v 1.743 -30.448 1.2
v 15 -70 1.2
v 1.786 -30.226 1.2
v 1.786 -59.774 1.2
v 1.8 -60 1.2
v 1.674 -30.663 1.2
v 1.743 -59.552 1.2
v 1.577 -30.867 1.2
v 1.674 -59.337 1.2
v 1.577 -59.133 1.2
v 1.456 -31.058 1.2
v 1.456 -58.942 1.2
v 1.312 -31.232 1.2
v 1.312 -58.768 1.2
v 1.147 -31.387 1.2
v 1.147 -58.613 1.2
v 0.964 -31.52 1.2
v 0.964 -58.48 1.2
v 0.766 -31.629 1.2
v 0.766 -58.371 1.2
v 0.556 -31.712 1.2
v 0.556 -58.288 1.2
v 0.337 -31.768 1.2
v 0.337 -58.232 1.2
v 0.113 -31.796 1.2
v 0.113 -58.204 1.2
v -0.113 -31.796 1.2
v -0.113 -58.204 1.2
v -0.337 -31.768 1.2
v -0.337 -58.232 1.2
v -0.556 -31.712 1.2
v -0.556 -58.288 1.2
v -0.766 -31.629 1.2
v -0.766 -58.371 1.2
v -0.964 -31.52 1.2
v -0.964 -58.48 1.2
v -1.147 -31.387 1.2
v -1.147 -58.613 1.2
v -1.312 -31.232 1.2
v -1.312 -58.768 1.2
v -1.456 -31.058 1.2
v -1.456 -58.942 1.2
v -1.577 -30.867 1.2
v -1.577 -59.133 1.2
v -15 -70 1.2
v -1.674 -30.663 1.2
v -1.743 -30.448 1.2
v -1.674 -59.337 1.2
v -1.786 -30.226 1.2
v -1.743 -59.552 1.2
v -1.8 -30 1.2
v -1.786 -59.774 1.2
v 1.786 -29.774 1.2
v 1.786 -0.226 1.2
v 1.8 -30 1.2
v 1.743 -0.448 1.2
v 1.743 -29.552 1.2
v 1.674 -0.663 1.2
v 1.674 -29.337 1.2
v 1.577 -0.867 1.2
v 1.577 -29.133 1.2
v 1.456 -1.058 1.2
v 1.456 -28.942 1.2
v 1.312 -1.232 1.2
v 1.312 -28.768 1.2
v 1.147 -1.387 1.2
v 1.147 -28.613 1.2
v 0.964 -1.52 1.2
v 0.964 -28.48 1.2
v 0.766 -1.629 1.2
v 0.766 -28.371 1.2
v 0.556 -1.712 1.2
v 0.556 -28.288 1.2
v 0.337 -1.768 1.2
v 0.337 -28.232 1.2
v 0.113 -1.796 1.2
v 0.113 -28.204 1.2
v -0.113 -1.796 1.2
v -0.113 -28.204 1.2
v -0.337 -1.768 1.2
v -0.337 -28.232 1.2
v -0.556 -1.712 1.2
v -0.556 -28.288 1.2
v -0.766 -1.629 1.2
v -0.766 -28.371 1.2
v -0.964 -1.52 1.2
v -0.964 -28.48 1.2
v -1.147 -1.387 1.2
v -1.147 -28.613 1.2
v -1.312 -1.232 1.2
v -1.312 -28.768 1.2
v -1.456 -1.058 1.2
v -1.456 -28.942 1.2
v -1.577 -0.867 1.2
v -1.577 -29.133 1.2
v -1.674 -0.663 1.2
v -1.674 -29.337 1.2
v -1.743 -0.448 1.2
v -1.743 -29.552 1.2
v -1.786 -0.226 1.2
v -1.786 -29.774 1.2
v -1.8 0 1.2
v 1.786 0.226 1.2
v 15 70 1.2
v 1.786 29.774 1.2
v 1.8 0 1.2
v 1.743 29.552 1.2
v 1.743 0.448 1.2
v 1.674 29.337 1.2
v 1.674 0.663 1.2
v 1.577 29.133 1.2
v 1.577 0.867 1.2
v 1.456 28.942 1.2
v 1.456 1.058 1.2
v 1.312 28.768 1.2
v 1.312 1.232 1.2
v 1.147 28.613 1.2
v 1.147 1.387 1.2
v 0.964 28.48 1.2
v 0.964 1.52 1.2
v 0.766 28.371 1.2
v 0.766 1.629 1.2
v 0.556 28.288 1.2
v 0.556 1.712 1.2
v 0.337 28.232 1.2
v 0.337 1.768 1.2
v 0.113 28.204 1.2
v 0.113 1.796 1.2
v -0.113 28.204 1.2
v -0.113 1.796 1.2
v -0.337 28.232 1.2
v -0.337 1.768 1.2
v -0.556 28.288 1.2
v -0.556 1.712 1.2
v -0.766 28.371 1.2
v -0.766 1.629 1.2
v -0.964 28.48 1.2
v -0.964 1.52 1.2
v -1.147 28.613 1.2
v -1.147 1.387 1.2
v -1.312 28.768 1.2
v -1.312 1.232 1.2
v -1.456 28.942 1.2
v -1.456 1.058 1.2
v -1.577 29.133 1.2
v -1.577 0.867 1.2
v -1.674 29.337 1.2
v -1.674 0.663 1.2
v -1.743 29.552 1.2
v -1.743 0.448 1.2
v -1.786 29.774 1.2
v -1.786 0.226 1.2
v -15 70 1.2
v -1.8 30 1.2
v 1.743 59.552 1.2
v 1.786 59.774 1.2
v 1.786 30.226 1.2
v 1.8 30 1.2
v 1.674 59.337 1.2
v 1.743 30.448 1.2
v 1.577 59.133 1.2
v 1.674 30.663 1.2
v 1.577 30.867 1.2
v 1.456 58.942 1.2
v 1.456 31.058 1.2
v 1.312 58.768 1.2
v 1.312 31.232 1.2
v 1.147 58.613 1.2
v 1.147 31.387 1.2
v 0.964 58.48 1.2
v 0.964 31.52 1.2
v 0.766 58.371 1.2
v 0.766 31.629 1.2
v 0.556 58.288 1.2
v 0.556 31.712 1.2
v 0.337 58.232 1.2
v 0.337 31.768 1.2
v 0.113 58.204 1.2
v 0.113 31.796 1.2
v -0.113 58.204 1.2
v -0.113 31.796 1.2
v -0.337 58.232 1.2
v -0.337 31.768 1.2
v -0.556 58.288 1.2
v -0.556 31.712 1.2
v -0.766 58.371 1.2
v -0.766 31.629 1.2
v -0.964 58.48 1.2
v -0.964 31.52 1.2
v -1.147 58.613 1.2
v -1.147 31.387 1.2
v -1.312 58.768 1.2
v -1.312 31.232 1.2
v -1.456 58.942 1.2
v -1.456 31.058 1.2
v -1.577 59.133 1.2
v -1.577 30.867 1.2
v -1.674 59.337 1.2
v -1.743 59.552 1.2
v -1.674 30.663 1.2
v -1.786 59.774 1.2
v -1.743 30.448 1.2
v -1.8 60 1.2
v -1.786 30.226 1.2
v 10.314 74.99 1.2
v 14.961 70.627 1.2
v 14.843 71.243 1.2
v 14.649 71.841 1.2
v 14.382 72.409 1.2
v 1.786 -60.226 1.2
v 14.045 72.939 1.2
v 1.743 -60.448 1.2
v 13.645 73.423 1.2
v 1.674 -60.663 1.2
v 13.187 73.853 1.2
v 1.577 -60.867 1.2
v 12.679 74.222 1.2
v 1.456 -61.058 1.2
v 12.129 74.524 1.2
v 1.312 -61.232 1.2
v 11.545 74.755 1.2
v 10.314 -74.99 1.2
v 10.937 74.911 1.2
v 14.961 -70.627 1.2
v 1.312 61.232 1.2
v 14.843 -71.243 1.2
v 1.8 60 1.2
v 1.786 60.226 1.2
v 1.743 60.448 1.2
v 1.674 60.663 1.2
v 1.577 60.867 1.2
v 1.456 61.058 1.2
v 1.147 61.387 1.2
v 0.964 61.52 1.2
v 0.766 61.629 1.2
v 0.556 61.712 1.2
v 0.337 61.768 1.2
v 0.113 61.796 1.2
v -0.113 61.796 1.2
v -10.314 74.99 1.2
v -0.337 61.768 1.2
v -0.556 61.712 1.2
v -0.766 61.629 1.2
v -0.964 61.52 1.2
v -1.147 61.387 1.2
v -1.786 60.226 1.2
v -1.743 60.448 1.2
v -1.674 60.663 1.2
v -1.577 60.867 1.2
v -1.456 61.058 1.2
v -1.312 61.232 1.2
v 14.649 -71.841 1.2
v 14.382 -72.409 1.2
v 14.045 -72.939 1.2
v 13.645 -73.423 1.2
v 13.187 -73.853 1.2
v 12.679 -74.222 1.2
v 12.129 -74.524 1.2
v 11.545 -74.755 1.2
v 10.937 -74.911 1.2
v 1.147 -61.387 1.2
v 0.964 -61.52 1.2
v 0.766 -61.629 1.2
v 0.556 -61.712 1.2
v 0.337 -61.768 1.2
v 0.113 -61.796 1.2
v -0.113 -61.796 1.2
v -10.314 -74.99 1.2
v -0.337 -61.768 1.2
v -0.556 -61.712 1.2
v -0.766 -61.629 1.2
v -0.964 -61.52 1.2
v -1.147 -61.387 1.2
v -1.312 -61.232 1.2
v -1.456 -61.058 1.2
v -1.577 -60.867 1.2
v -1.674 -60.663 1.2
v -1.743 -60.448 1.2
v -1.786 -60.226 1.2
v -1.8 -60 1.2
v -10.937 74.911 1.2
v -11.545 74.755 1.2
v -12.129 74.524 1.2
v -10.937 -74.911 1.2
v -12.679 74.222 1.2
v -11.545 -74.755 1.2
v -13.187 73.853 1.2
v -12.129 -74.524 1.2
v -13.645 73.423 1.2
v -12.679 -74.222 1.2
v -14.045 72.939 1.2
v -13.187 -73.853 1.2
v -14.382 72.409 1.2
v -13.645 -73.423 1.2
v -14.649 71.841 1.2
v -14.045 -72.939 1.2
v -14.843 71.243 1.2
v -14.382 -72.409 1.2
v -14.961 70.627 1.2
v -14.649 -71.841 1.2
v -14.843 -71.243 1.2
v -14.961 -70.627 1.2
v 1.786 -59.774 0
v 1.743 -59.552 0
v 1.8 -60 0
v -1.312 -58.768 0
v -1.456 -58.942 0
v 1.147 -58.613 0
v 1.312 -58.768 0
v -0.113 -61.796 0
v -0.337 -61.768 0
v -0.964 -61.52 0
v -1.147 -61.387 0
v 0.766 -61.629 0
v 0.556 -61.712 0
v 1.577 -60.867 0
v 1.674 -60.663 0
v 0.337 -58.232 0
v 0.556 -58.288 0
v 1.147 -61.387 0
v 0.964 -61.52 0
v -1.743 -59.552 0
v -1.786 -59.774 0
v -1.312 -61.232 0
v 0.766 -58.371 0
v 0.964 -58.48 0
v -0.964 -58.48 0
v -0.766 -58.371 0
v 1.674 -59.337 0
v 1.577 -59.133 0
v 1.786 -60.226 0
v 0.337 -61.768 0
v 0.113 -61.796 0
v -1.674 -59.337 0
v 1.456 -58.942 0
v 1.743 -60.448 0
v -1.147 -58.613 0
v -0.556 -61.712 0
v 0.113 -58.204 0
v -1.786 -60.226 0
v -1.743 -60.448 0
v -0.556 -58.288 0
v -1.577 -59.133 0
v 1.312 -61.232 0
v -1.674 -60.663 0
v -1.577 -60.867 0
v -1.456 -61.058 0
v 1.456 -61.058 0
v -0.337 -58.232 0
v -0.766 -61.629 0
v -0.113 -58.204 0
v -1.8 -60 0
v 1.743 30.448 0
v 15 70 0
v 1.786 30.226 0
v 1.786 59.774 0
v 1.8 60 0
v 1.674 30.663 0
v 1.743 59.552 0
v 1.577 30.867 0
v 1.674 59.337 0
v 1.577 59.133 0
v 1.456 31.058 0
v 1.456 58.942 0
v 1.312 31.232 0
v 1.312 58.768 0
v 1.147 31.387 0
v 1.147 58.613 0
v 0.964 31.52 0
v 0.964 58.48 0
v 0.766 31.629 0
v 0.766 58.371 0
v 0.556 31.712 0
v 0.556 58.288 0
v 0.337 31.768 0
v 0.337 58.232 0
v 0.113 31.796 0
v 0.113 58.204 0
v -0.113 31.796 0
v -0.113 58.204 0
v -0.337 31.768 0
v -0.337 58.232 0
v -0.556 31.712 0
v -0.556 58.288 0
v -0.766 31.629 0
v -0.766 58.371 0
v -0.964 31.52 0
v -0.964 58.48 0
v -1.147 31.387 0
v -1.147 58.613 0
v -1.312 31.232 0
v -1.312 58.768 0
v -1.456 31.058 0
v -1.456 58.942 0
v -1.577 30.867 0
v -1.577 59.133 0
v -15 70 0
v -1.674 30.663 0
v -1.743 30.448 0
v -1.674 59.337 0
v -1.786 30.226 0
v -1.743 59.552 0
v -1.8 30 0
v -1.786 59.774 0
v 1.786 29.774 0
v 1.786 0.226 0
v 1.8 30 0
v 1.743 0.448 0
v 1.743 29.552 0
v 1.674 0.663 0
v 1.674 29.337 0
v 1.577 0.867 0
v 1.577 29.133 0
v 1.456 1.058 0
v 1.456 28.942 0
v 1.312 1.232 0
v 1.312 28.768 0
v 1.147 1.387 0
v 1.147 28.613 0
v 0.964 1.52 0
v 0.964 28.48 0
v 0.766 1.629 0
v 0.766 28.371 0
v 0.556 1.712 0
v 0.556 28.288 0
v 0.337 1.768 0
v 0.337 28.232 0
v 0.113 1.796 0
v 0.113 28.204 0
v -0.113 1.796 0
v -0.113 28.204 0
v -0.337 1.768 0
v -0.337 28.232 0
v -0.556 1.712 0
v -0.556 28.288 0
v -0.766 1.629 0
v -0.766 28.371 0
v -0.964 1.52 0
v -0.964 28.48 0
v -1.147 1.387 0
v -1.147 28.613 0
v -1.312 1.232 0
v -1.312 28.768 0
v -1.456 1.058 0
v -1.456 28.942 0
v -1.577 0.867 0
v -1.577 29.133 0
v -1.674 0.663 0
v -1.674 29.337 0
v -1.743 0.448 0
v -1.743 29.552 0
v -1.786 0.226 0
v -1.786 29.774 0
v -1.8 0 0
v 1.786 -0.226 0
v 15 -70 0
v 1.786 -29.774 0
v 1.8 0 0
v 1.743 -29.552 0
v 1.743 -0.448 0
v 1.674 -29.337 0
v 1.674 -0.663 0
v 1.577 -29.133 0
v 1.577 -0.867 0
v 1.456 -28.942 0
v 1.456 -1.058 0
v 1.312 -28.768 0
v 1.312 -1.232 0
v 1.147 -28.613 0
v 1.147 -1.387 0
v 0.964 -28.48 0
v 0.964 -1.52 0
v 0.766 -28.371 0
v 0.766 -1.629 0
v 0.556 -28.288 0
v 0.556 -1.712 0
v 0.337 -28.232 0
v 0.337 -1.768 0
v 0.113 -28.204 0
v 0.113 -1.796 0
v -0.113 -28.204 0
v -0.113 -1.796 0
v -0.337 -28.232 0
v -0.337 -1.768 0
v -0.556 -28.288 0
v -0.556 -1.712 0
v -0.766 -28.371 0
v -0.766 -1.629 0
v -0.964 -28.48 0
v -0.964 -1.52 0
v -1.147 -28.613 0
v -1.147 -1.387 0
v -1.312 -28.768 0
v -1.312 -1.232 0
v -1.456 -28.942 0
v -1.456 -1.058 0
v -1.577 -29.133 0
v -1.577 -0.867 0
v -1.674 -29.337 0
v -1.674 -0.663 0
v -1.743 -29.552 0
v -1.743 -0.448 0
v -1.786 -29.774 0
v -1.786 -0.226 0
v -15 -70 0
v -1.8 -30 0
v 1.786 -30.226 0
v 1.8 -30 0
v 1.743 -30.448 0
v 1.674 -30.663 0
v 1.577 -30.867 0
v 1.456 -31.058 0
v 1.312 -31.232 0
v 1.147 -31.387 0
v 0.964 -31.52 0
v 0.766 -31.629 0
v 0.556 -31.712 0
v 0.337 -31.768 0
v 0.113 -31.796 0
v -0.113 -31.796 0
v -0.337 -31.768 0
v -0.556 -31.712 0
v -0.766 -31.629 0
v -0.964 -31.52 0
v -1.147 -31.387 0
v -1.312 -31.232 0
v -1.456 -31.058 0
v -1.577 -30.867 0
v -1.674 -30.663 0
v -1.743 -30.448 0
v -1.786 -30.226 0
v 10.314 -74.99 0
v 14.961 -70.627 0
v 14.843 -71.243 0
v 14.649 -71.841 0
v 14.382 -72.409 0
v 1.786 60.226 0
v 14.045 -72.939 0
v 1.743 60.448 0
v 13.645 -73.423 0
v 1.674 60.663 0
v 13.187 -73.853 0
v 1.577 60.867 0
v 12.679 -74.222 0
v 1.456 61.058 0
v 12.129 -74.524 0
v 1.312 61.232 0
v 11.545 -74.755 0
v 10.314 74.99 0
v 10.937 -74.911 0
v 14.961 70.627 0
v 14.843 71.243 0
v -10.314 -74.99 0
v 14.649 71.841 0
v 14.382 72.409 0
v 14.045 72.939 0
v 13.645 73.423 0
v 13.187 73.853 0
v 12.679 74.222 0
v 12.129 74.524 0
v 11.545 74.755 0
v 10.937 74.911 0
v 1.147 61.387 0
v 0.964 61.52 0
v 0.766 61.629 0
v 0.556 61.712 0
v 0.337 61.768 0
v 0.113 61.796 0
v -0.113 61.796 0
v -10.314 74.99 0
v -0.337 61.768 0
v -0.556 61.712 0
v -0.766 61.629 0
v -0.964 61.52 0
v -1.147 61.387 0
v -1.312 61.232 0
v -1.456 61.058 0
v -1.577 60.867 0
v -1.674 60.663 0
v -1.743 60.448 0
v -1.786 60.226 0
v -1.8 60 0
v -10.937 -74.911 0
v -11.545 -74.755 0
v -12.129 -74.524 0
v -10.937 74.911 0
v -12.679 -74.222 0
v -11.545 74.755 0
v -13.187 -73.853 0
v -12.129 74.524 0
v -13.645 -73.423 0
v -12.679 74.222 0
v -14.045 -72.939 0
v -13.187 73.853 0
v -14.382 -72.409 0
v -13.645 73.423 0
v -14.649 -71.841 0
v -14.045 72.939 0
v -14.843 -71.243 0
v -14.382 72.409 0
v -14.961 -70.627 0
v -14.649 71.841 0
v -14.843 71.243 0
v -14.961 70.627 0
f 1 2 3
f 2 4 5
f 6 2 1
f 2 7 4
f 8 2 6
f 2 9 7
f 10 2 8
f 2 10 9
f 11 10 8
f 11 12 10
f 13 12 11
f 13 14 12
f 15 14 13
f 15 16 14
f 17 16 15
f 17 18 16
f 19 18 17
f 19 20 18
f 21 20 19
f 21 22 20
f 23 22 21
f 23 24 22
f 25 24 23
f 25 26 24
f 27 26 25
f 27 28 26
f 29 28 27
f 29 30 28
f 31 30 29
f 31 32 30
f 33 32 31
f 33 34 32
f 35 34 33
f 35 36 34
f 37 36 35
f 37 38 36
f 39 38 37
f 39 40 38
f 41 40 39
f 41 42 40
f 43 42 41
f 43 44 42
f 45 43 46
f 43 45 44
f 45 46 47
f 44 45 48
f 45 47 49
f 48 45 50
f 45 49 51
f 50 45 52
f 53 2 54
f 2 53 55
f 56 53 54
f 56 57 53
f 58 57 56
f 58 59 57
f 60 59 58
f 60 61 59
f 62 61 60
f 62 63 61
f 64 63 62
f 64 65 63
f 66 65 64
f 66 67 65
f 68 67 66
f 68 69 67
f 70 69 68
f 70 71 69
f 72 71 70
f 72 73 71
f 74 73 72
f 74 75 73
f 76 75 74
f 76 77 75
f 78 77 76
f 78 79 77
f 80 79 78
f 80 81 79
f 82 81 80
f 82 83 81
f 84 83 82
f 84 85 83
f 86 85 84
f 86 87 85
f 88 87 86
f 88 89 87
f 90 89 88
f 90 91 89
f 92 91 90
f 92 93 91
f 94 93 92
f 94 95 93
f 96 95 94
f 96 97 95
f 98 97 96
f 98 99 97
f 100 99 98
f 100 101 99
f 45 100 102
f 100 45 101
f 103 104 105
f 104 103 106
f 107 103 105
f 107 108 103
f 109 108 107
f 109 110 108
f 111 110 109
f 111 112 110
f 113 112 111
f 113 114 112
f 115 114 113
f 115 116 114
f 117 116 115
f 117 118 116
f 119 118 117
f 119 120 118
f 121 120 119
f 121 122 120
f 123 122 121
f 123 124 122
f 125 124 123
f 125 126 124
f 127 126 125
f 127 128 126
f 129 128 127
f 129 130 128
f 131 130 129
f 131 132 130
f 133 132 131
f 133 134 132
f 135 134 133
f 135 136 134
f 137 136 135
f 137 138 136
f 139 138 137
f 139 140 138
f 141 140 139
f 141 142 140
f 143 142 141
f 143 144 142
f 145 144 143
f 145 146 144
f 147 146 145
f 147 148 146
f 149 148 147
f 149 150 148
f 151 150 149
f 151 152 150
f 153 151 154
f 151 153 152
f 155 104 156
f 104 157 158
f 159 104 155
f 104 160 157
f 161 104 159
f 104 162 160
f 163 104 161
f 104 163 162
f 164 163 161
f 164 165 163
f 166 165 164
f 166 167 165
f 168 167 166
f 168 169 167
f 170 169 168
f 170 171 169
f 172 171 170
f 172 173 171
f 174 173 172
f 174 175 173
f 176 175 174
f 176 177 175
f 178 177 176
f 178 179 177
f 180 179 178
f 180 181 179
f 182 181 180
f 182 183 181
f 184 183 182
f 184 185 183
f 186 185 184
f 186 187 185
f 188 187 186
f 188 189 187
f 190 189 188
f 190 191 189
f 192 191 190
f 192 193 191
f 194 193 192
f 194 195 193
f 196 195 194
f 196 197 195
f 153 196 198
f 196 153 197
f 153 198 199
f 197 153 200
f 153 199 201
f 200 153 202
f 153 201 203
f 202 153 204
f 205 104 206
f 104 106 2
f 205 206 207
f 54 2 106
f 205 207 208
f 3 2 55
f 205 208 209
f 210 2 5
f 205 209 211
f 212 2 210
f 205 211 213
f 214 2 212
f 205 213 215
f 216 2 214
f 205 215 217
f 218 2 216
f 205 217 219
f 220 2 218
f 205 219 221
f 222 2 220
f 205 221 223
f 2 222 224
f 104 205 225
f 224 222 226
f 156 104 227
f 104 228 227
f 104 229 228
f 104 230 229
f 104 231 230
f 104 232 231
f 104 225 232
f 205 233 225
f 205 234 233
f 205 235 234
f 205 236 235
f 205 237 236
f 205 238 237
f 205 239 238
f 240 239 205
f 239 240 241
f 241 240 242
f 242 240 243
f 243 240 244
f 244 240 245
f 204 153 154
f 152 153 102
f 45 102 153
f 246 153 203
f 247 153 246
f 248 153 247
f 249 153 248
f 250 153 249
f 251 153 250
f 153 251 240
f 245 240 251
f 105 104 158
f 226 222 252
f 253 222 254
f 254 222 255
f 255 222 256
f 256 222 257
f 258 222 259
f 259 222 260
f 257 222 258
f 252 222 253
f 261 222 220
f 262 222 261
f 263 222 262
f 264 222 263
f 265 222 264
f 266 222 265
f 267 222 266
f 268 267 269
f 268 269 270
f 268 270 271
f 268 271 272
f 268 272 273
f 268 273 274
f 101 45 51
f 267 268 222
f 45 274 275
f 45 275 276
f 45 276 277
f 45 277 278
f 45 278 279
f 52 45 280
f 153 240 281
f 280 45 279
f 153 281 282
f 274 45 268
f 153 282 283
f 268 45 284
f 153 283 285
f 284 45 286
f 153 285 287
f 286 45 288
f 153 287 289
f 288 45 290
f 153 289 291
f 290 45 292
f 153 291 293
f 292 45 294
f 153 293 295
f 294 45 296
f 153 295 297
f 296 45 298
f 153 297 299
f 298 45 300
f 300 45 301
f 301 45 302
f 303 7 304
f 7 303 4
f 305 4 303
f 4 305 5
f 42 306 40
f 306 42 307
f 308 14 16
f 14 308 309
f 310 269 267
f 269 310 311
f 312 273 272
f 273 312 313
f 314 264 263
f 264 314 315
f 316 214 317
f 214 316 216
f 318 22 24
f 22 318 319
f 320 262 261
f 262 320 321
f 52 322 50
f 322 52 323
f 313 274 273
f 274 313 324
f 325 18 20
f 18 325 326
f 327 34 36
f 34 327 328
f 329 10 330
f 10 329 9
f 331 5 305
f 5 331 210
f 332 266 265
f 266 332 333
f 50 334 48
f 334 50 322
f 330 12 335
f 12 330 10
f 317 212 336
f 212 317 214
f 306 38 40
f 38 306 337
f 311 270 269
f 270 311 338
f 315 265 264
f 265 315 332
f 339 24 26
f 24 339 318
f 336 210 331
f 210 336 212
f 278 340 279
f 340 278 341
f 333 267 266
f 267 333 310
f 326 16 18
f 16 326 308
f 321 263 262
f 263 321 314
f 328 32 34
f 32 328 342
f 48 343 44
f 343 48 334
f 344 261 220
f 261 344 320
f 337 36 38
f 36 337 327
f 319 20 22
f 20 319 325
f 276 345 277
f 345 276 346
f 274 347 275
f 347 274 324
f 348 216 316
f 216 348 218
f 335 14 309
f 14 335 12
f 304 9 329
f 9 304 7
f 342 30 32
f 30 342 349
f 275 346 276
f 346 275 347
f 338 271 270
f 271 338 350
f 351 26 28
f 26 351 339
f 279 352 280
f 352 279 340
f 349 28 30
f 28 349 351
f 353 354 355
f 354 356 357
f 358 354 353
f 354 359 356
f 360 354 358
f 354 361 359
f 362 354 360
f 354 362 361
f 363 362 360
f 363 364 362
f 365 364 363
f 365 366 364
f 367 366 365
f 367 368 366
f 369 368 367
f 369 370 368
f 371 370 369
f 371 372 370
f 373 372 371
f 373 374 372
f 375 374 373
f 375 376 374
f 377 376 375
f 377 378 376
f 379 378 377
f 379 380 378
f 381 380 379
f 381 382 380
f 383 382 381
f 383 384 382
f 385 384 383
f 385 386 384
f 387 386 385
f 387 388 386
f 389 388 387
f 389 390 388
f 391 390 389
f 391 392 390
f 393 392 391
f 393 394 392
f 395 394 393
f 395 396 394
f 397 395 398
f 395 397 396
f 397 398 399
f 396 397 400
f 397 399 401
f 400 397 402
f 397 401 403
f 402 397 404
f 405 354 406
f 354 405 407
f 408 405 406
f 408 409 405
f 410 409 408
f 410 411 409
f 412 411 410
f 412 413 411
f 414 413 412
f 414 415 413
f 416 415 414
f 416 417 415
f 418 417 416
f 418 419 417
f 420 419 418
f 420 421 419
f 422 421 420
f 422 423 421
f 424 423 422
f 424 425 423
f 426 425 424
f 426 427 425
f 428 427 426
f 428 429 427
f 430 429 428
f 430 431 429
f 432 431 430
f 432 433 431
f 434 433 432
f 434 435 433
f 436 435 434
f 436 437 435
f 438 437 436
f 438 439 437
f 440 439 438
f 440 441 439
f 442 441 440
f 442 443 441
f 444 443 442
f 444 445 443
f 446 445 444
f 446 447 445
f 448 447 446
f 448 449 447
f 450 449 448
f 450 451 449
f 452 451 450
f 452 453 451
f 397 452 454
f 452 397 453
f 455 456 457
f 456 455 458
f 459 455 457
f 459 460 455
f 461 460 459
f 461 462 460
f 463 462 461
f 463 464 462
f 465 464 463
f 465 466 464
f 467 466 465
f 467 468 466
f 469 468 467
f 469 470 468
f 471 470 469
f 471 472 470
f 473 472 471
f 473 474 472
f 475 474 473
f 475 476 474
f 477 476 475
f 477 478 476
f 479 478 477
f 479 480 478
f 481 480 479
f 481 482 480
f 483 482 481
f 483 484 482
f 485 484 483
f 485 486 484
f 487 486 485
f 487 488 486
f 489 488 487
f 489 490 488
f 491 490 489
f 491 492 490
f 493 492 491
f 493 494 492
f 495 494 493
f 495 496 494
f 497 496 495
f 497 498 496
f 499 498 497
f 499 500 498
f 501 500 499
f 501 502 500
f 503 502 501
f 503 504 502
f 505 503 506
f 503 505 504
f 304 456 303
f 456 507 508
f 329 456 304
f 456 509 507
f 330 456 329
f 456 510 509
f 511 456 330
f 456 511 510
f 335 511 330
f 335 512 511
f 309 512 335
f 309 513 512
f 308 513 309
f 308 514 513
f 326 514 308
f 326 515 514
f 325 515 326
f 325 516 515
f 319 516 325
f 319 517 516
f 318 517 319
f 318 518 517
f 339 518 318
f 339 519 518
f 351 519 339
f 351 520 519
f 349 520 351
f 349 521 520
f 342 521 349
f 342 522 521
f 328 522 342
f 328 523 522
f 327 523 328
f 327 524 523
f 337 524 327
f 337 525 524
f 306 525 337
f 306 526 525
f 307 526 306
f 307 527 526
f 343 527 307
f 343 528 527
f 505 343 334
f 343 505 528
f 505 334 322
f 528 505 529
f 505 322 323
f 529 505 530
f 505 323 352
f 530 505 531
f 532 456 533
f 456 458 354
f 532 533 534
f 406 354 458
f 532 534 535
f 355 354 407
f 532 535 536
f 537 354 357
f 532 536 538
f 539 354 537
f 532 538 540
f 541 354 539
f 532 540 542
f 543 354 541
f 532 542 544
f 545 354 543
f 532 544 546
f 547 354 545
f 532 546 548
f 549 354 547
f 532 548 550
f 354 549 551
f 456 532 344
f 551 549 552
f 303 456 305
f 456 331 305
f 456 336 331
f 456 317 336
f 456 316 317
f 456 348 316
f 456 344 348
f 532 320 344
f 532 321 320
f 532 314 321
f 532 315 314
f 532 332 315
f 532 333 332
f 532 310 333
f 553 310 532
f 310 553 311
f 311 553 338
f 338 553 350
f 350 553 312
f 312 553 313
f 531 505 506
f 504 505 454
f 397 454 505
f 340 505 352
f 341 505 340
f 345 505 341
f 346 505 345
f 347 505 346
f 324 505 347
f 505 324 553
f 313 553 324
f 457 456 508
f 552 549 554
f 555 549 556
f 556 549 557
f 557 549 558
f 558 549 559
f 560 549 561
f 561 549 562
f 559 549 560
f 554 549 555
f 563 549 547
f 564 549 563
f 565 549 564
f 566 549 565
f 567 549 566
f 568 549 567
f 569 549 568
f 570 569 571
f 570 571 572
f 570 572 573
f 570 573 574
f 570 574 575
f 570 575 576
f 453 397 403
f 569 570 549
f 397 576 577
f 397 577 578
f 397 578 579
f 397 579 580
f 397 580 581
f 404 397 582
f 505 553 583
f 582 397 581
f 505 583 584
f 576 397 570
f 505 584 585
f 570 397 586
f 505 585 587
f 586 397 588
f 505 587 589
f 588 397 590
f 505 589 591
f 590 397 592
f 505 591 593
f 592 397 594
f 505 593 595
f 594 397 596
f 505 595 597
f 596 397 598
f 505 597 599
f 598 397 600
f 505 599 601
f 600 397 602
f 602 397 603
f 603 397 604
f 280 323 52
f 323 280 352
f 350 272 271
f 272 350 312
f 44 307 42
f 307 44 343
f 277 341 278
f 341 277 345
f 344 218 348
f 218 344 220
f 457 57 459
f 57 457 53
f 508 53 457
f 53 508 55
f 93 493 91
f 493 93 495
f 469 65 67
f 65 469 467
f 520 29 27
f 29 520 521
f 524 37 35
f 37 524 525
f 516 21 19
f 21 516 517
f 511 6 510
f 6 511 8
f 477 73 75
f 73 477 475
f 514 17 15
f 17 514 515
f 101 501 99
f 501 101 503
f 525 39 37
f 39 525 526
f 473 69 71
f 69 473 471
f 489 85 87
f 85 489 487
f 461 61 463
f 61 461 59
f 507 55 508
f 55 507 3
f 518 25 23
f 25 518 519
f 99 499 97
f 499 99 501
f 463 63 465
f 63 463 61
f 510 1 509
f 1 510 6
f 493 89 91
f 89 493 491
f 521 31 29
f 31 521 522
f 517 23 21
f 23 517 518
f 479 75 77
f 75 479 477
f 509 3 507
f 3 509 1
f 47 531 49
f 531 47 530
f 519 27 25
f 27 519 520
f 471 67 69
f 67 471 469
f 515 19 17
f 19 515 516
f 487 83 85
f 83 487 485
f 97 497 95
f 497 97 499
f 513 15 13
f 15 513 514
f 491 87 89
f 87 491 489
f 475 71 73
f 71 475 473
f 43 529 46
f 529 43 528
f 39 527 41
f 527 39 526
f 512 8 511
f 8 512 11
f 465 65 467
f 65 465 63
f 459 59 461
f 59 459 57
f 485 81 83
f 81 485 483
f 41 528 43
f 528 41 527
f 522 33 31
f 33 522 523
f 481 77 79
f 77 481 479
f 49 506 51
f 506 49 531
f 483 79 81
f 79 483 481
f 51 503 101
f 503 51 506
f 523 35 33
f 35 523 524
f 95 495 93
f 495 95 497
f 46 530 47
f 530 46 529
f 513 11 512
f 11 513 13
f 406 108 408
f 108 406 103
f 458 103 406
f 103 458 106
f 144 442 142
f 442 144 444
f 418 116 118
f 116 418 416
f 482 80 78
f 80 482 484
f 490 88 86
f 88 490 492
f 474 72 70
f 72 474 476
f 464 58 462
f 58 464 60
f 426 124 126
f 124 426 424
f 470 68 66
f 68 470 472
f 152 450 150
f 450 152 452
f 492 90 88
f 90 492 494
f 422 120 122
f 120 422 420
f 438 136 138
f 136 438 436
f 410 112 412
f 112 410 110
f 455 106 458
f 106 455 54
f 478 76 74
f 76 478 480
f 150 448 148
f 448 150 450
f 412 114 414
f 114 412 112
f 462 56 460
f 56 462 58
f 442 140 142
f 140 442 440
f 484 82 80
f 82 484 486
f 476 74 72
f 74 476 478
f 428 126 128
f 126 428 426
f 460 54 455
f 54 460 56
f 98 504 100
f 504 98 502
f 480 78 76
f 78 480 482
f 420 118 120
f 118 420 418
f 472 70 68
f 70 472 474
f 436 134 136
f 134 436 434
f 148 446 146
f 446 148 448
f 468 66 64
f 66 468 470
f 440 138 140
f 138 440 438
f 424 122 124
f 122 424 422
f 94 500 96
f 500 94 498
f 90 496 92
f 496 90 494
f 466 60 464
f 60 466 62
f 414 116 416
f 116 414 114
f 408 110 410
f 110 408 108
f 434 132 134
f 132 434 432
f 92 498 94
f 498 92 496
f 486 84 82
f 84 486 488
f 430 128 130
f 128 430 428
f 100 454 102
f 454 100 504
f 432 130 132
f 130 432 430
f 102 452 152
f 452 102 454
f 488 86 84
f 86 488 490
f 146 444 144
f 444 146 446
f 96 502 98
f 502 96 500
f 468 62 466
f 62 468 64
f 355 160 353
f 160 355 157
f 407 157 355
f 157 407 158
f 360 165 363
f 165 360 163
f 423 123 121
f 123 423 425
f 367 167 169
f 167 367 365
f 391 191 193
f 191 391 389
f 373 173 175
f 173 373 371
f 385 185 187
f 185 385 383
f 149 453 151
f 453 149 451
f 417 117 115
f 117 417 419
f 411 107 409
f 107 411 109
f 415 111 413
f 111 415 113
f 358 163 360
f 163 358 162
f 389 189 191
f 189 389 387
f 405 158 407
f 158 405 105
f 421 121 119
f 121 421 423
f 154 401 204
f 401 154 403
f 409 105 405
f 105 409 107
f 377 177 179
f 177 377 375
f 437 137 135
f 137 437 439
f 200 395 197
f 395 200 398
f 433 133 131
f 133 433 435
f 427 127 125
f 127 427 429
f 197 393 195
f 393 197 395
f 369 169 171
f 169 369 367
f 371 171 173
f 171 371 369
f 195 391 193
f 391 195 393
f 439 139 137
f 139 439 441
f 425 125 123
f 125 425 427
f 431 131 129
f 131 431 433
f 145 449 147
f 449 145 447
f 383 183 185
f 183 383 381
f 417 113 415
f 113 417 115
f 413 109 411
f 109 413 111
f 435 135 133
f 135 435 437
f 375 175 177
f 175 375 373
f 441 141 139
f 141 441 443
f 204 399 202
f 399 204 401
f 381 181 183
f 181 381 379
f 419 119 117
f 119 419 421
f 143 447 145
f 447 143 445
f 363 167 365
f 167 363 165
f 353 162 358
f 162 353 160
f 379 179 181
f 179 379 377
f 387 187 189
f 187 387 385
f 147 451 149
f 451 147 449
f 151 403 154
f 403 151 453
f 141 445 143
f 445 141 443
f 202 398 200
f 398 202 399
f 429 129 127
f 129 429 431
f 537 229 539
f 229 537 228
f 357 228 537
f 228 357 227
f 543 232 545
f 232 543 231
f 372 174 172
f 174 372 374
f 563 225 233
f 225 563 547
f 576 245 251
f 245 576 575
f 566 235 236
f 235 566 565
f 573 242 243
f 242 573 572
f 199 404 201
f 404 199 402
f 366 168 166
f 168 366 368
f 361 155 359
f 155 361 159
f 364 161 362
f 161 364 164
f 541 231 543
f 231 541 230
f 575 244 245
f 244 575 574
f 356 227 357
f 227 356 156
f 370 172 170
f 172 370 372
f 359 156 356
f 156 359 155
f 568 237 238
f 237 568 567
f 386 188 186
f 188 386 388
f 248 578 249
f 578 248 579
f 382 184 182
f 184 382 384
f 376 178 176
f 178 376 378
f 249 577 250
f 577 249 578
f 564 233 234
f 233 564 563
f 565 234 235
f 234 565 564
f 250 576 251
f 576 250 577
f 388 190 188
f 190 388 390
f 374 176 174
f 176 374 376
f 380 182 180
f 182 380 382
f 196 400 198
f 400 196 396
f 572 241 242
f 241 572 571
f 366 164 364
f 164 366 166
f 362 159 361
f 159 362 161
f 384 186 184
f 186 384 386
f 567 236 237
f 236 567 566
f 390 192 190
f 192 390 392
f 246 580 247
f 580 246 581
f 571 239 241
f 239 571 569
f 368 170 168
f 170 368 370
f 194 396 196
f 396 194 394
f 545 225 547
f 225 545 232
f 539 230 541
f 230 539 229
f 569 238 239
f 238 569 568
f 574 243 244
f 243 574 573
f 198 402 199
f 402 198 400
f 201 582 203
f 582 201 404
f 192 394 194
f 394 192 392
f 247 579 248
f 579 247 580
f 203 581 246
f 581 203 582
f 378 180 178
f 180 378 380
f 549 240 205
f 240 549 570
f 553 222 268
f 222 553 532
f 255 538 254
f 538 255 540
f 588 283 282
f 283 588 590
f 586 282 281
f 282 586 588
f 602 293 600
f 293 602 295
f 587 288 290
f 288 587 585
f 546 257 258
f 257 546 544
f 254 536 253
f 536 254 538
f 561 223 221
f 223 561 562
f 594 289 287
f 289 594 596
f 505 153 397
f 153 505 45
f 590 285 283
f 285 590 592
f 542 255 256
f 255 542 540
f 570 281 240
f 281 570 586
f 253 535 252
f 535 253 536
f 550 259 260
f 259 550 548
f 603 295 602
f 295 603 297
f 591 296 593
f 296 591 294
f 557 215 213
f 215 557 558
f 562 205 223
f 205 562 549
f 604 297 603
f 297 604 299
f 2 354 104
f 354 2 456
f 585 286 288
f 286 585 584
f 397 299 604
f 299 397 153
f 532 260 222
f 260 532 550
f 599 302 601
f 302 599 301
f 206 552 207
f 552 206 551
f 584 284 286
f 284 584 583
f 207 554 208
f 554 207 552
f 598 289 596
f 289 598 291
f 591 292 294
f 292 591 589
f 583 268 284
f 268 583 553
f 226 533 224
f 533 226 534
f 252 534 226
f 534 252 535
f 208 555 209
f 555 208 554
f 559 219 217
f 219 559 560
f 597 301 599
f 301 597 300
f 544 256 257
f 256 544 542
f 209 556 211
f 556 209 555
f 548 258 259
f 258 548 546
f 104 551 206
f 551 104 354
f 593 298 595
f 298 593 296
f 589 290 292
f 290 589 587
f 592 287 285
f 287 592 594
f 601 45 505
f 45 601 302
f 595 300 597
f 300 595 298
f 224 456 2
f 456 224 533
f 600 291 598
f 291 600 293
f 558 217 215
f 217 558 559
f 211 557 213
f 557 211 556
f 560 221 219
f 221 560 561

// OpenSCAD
$fn = 50;


difference() {
	union() {
		hull() {
			translate(v = [-10.0000000000, 70.0000000000, 0]) {
				cylinder(h = 21, r = 5);
			}
			translate(v = [10.0000000000, 70.0000000000, 0]) {
				cylinder(h = 21, r = 5);
			}
			translate(v = [-10.0000000000, -70.0000000000, 0]) {
				cylinder(h = 21, r = 5);
			}
			translate(v = [10.0000000000, -70.0000000000, 0]) {
				cylinder(h = 21, r = 5);
			}
		}
	}
	union() {
		translate(v = [0, 0, 1.2000000000]) {
			hull() {
				translate(v = [-10.0000000000, 70.0000000000, 0]) {
					cylinder(h = 19.8000000000, r = 3.8000000000);
				}
				translate(v = [10.0000000000, 70.0000000000, 0]) {
					cylinder(h = 19.8000000000, r = 3.8000000000);
				}
				translate(v = [-10.0000000000, -70.0000000000, 0]) {
					cylinder(h = 19.8000000000, r = 3.8000000000);
				}
				translate(v = [10.0000000000, -70.0000000000, 0]) {
					cylinder(h = 19.8000000000, r = 3.8000000000);
				}
			}
		}
		#translate(v = [0.0000000000, -60.0000000000, 0]) {
			cylinder(h = 1.2000000000, r = 1.8000000000);
		}
		#translate(v = [0.0000000000, -30.0000000000, 0]) {
			cylinder(h = 1.2000000000, r = 1.8000000000);
		}
		#cylinder(h = 1.2000000000, r = 1.8000000000);
		#translate(v = [0.0000000000, 30.0000000000, 0]) {
			cylinder(h = 1.2000000000, r = 1.8000000000);
		}
		#translate(v = [0.0000000000, 60.0000000000, 0]) {
			cylinder(h = 1.2000000000, r = 1.8000000000);
		}
		translate(v = [-250.0000000000, -250.0000000000, 1.2000000000]) {
			cube(size = [500, 500, 500]);
		}
		translate(v = [-250.0000000000, -250.0000000000, 1.2000000000]) {
			cube(size = [500, 500, 500]);
		}
		translate(v = [-250.0000000000, -250.0000000000, 1.2000000000]) {
			cube(size = [500, 500, 500]);
		}
	}
}
